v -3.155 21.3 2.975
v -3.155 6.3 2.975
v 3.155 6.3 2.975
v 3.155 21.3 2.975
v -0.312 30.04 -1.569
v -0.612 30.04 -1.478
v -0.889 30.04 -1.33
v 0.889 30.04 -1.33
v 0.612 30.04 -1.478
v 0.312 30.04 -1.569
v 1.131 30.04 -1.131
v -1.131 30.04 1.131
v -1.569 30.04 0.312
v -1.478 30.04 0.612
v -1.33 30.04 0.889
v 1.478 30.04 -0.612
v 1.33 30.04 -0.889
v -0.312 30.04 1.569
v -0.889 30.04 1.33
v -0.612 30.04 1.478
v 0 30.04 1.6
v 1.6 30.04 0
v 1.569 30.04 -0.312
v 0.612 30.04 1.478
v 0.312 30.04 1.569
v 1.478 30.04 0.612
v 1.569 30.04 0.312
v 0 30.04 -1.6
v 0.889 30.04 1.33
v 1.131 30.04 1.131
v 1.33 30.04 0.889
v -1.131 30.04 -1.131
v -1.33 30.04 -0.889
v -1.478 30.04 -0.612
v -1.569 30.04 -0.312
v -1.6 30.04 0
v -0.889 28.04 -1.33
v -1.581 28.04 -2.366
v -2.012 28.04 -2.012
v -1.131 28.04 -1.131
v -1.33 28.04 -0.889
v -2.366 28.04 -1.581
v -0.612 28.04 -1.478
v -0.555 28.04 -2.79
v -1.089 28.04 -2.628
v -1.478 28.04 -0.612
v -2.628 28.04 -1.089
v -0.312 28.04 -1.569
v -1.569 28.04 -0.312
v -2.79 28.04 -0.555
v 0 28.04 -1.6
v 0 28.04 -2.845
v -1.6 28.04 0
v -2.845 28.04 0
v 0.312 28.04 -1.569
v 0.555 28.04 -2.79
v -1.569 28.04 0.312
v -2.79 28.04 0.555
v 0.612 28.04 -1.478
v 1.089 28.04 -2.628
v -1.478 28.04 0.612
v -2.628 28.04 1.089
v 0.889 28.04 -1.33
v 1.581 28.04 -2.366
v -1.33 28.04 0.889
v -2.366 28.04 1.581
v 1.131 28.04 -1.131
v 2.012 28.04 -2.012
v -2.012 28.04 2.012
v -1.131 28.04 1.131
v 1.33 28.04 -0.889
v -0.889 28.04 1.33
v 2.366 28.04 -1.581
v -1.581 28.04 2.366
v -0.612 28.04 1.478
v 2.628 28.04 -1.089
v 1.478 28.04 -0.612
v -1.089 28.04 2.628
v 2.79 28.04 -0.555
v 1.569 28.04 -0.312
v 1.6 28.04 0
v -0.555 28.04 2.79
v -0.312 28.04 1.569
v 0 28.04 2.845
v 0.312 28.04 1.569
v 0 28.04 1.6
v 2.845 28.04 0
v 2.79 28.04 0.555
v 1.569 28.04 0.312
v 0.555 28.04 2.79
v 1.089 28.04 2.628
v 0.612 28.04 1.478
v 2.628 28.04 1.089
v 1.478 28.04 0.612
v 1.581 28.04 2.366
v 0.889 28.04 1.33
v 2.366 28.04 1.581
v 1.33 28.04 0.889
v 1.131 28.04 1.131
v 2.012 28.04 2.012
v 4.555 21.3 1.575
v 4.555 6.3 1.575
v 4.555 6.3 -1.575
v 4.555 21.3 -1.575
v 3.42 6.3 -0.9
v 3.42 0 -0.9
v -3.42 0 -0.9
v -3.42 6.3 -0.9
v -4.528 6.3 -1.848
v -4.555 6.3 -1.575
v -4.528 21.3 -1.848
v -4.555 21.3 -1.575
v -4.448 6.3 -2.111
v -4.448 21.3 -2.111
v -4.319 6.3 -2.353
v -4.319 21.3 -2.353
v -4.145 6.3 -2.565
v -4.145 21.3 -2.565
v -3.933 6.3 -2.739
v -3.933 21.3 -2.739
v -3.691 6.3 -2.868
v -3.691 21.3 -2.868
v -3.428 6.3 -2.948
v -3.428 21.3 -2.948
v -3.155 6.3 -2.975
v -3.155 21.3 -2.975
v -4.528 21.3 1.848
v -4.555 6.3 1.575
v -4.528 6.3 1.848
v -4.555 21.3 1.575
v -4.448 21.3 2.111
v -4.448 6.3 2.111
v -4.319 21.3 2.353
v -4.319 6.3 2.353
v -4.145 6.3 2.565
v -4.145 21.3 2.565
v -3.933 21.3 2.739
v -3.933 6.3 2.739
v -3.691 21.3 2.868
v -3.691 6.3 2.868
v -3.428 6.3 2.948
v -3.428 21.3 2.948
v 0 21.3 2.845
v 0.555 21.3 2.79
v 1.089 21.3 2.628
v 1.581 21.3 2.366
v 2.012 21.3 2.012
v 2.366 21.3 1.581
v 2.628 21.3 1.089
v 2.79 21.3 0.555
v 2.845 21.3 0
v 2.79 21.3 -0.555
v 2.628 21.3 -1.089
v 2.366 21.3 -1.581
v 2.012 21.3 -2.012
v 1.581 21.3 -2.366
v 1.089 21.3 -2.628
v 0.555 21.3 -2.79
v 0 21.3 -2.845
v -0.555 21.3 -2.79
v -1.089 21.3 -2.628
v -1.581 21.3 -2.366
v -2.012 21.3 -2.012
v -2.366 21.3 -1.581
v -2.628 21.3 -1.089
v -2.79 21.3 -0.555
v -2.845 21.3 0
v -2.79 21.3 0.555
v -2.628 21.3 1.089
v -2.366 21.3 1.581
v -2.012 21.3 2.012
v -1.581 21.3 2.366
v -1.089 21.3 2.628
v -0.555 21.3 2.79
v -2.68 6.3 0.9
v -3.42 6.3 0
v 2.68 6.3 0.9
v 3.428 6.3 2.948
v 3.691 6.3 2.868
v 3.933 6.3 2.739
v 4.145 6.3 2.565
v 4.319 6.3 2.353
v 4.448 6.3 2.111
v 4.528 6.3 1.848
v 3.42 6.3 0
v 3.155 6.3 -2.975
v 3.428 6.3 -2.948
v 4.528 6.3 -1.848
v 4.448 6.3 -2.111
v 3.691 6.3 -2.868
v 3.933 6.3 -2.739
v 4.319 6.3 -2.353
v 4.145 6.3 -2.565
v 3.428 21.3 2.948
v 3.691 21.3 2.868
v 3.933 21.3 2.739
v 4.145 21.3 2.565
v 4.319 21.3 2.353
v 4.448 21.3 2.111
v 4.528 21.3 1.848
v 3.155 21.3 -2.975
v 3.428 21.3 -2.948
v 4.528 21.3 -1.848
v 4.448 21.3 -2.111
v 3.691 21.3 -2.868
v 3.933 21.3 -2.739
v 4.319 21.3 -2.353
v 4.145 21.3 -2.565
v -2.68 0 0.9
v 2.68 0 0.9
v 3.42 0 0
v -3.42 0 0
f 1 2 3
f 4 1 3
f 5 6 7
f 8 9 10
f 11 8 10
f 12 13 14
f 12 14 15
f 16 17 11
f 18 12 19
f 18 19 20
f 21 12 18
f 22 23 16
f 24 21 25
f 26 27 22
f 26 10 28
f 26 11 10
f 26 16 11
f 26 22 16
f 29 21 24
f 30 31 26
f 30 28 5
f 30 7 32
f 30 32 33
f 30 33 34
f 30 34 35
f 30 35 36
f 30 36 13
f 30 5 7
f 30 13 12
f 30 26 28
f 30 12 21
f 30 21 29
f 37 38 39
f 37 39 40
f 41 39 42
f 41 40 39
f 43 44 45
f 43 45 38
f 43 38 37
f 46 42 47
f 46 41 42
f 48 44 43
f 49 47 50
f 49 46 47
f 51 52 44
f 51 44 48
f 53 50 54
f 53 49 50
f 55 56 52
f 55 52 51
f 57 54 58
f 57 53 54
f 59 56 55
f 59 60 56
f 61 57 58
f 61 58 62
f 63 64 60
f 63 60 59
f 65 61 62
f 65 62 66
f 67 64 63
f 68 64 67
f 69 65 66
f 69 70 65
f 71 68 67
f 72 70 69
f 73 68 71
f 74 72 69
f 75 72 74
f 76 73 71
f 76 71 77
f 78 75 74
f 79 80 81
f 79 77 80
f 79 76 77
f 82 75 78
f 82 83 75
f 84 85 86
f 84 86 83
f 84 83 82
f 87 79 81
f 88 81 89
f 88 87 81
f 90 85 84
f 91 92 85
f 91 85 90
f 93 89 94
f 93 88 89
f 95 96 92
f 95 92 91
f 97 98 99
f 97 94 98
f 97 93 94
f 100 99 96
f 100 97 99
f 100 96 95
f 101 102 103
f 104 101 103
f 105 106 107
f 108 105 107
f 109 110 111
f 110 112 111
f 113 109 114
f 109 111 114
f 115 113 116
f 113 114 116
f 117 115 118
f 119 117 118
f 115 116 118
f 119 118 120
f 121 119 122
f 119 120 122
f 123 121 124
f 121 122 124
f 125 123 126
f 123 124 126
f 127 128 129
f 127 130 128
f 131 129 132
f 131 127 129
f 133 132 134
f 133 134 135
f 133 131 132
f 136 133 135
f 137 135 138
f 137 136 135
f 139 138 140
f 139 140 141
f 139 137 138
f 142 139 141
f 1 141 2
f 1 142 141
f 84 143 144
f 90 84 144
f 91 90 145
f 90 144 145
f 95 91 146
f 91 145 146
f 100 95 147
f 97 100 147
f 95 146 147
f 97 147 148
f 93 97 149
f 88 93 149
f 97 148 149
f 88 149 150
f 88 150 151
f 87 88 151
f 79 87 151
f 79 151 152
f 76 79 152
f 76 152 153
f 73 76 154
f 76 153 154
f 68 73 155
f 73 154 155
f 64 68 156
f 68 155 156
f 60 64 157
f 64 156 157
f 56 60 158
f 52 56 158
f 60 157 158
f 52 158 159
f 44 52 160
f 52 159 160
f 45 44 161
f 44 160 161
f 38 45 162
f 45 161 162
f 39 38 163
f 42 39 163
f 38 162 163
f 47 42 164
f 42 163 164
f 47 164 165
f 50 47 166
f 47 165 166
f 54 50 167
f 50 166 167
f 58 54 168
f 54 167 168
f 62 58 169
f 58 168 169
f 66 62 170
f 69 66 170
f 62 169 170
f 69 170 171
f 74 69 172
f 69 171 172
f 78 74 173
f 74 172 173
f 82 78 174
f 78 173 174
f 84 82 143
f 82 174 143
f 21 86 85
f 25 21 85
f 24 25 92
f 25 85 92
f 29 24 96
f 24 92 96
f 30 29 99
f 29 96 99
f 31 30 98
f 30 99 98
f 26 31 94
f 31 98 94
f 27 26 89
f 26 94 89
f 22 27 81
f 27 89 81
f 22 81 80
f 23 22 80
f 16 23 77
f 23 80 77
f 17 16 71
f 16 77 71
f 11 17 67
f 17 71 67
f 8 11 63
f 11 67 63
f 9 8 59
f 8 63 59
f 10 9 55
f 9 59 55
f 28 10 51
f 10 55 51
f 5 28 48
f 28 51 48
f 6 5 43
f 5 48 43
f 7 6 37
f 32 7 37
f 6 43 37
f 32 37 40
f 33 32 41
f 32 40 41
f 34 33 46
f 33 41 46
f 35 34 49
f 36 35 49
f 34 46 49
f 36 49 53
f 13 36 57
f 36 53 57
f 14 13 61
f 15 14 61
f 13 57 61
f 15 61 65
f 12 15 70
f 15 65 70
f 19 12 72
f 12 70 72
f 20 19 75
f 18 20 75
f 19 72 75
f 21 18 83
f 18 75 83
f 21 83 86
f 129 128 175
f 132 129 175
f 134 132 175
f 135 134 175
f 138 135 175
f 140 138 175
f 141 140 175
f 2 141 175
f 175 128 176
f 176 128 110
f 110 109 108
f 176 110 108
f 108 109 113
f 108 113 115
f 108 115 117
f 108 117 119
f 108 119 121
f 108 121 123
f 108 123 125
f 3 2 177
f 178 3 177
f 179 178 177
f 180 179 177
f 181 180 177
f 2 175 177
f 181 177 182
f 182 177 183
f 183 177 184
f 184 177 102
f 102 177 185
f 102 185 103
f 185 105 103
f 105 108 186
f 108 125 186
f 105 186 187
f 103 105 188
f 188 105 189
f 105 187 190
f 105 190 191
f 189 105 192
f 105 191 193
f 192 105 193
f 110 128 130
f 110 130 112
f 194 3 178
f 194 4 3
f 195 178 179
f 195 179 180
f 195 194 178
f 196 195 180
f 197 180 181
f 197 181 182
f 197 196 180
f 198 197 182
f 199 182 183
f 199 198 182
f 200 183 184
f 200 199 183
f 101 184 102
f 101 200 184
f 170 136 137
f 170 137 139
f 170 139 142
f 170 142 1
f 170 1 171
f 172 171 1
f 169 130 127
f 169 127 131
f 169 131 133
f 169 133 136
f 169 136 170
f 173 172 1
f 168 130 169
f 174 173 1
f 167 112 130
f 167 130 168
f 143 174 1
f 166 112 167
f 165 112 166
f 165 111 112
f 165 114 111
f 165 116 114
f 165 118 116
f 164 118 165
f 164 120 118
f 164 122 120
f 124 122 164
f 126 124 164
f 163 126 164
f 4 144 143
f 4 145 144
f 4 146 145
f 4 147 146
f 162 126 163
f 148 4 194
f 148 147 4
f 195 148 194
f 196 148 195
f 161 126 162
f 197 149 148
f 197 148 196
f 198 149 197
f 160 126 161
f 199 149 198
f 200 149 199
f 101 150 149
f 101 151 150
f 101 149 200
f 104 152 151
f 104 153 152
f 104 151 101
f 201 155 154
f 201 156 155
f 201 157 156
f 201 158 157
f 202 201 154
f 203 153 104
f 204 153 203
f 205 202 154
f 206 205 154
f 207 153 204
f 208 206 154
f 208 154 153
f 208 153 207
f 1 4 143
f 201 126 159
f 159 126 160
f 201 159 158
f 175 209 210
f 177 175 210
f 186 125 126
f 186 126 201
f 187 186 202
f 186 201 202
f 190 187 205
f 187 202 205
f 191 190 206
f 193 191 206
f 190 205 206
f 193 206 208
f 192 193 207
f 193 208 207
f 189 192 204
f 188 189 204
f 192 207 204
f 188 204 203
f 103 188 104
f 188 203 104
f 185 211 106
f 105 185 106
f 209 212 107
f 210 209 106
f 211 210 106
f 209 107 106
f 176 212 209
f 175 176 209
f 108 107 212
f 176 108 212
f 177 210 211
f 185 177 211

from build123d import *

# Parameters (mm, degrees)
BOSS_EXTRUDE1_DEPTH = 6.3
SKETCH2_W           = 9.11
SKETCH2_H           = 5.95
BOSS_EXTRUDE2_DEPTH = 15
FILLET1_R           = 1.4
SKETCH4_R           = 2.845
BOSS_EXTRUDE3_DEPTH = 6.74
SKETCH5_R           = 1.6
BOSS_EXTRUDE4_DEPTH = 2


with BuildPart() as part:
    # Sketch1 → Boss-Extrude1 (new body)
    with BuildSketch(Plane(origin=(0, 0, 0), x_dir=(1, 0, 0), z_dir=(0, 1, 0))):
        Polygon((-3.42, 0), (-2.68, -0.9), (2.68, -0.9), (3.42, 0), (3.42, 0.9), (-3.42, 0.9), align=None)
    extrude(amount=BOSS_EXTRUDE1_DEPTH)

    # Sketch2 → Boss-Extrude2 (add)
    with BuildSketch(Plane(origin=(0, 6.3, 0), x_dir=(1, 0, 0), z_dir=(0, 1, 0))):
        Rectangle(SKETCH2_W, SKETCH2_H)
    extrude(amount=BOSS_EXTRUDE2_DEPTH)

    # Fillet1
    fillet1_edges = [part.edges().sort_by_distance(p)[0] for p in [
        (4.555, 13.8, 2.975),
        (4.555, 13.8, -2.975),
        (-4.555, 13.8, -2.975),
        (-4.555, 13.8, 2.975),
    ]]
    fillet(fillet1_edges, radius=FILLET1_R)

    # Sketch4 → Boss-Extrude3 (add)
    with BuildSketch(Plane(origin=(0, 21.3, 0), x_dir=(1, 0, 0), z_dir=(0, 1, 0))):
        with Locations(Location((0, 0, 0), (0, 0, 270))):
            Circle(SKETCH4_R)
    extrude(amount=BOSS_EXTRUDE3_DEPTH)

    # Sketch5 → Boss-Extrude4 (add)
    with BuildSketch(Plane(origin=(0, 28.04, 0), x_dir=(1, 0, 0), z_dir=(0, 1, 0))):
        with Locations(Location((0, 0, 0), (0, 0, 270))):
            Circle(SKETCH5_R)
    extrude(amount=BOSS_EXTRUDE4_DEPTH)


solid = part.part
